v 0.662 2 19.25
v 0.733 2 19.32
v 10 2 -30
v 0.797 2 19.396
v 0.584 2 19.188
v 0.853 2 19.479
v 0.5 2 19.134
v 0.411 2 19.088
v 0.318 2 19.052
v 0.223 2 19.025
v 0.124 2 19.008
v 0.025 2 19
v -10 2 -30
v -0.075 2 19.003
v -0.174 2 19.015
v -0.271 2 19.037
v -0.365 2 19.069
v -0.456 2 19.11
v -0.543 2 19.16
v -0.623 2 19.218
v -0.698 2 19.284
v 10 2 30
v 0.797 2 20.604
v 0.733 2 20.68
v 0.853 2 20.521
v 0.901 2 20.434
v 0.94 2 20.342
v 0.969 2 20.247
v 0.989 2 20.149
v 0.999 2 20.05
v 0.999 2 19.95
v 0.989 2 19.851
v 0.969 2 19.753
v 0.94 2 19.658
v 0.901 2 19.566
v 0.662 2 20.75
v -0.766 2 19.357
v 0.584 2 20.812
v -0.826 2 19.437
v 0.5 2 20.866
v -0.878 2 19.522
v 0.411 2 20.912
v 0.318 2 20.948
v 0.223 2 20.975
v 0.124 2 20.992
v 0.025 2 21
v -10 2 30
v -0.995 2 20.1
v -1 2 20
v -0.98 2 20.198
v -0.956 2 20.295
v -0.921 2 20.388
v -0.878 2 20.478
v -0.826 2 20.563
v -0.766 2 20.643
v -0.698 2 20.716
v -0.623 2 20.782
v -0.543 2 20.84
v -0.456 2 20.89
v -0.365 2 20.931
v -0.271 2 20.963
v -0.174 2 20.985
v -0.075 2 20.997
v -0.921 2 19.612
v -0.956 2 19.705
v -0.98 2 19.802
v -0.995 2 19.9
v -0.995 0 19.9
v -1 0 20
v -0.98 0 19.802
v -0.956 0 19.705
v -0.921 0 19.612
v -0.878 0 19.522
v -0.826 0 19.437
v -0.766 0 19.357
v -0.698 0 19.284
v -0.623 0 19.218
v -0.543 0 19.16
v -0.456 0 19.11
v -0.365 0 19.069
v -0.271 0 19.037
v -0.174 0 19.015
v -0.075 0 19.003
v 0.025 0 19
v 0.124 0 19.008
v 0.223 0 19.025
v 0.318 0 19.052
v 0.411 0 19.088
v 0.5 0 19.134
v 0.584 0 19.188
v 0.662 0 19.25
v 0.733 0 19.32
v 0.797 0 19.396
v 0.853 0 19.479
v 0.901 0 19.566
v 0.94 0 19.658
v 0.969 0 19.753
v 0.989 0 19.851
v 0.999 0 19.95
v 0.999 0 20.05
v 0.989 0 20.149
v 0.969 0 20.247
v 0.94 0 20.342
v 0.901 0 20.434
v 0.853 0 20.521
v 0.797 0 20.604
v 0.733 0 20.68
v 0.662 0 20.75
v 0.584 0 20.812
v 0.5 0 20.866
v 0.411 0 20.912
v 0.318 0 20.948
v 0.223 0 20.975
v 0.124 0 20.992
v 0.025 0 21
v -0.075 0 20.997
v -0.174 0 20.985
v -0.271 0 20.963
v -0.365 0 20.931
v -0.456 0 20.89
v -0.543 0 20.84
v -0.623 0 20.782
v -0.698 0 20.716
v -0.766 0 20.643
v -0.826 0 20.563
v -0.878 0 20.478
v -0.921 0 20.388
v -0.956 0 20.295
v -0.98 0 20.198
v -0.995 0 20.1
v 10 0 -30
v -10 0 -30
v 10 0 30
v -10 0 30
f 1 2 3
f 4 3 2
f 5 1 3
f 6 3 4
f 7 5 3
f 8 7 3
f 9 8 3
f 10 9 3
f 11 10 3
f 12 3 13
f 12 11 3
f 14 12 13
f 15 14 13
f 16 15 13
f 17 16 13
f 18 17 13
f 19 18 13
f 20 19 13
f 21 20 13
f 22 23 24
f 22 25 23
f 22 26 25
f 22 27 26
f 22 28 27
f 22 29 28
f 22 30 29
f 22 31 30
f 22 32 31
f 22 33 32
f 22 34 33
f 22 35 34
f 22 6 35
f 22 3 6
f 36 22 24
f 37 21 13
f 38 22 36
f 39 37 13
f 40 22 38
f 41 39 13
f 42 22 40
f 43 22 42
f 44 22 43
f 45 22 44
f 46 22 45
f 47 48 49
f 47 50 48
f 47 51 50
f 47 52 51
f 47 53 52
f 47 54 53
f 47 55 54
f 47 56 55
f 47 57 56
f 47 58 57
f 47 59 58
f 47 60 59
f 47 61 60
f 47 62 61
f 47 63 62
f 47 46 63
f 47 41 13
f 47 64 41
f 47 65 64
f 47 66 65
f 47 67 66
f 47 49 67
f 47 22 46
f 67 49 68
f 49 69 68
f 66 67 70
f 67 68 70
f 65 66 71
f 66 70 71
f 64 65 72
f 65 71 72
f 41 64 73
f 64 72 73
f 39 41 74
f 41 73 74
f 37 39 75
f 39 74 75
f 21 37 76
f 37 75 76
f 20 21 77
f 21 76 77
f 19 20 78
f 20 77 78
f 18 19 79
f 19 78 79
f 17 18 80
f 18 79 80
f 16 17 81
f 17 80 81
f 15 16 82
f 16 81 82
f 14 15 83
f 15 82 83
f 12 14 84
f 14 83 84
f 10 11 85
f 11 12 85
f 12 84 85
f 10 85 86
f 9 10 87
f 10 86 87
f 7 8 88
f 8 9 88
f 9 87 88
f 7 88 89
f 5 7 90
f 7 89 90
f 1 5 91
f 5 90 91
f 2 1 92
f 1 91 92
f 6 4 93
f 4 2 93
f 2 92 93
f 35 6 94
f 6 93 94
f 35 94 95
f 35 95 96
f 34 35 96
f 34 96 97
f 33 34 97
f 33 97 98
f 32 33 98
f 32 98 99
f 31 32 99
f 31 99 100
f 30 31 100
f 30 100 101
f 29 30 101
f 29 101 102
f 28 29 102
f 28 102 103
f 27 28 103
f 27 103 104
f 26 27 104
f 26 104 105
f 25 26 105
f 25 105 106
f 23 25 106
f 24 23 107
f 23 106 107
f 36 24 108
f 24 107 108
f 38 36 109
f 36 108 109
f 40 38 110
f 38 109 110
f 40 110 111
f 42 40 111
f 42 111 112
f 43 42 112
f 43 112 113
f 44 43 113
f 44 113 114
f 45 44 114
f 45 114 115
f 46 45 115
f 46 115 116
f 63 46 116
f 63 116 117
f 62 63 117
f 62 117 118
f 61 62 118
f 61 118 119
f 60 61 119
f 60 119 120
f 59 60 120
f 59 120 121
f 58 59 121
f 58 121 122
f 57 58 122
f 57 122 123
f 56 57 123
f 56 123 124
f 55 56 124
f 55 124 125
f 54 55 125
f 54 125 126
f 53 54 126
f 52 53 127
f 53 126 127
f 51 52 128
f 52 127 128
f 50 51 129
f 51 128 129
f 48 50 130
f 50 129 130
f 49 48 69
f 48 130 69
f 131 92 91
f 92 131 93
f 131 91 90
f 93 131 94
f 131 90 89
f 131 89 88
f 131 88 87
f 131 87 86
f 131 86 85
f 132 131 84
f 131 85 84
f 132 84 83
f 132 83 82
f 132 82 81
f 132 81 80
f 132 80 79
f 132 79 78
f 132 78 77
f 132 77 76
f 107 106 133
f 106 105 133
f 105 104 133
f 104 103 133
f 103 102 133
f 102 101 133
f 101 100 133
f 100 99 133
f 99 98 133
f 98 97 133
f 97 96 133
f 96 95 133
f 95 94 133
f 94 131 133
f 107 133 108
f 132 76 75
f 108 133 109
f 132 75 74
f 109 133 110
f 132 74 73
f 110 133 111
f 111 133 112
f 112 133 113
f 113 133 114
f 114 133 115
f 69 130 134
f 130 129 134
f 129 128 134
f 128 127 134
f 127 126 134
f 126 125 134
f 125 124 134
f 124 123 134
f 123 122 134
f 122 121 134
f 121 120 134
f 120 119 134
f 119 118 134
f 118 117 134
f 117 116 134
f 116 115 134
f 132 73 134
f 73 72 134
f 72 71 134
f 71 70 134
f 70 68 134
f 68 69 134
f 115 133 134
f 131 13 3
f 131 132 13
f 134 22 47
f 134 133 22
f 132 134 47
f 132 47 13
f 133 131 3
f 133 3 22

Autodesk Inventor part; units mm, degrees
ref_plane "YZ Plane" through (0, 0, 0) normal (1, 0, 0) x (0, 1, 0)
ref_plane "XZ Plane" through (0, 0, 0) normal (0, 1, 0) x (-1, 0, 0)
ref_plane "XY Plane" through (0, 0, 0) normal (0, 0, 1) x (1, 0, 0)
sketch "Skizze1" plane through (0, 0, 0) normal (0, 1, 0) x (-1, 0, 0)
  line L0 (-10, 30) -> (10, 30)
  line L1 (10, 30) -> (10, -30)
  line L2 (10, -30) -> (-10, -30)
  line L3 (-10, -30) -> (-10, 30)
  line L4 (-10, 30) -> (10, -30) construction
  line L5 (10, 30) -> (-10, -30) construction
  circle A0 centre (0, 20) radius 1
  point P0 (0, 0)
  point P1 (0, 0)
  dimension "d0" = 60
  dimension "d1" = 20
  dimension "d2" = 2
  dimension "d3" = 10
extrude "Extrusion1" add sketch "Skizze1" along normal blind 2
properties part number "Grundplatte"
